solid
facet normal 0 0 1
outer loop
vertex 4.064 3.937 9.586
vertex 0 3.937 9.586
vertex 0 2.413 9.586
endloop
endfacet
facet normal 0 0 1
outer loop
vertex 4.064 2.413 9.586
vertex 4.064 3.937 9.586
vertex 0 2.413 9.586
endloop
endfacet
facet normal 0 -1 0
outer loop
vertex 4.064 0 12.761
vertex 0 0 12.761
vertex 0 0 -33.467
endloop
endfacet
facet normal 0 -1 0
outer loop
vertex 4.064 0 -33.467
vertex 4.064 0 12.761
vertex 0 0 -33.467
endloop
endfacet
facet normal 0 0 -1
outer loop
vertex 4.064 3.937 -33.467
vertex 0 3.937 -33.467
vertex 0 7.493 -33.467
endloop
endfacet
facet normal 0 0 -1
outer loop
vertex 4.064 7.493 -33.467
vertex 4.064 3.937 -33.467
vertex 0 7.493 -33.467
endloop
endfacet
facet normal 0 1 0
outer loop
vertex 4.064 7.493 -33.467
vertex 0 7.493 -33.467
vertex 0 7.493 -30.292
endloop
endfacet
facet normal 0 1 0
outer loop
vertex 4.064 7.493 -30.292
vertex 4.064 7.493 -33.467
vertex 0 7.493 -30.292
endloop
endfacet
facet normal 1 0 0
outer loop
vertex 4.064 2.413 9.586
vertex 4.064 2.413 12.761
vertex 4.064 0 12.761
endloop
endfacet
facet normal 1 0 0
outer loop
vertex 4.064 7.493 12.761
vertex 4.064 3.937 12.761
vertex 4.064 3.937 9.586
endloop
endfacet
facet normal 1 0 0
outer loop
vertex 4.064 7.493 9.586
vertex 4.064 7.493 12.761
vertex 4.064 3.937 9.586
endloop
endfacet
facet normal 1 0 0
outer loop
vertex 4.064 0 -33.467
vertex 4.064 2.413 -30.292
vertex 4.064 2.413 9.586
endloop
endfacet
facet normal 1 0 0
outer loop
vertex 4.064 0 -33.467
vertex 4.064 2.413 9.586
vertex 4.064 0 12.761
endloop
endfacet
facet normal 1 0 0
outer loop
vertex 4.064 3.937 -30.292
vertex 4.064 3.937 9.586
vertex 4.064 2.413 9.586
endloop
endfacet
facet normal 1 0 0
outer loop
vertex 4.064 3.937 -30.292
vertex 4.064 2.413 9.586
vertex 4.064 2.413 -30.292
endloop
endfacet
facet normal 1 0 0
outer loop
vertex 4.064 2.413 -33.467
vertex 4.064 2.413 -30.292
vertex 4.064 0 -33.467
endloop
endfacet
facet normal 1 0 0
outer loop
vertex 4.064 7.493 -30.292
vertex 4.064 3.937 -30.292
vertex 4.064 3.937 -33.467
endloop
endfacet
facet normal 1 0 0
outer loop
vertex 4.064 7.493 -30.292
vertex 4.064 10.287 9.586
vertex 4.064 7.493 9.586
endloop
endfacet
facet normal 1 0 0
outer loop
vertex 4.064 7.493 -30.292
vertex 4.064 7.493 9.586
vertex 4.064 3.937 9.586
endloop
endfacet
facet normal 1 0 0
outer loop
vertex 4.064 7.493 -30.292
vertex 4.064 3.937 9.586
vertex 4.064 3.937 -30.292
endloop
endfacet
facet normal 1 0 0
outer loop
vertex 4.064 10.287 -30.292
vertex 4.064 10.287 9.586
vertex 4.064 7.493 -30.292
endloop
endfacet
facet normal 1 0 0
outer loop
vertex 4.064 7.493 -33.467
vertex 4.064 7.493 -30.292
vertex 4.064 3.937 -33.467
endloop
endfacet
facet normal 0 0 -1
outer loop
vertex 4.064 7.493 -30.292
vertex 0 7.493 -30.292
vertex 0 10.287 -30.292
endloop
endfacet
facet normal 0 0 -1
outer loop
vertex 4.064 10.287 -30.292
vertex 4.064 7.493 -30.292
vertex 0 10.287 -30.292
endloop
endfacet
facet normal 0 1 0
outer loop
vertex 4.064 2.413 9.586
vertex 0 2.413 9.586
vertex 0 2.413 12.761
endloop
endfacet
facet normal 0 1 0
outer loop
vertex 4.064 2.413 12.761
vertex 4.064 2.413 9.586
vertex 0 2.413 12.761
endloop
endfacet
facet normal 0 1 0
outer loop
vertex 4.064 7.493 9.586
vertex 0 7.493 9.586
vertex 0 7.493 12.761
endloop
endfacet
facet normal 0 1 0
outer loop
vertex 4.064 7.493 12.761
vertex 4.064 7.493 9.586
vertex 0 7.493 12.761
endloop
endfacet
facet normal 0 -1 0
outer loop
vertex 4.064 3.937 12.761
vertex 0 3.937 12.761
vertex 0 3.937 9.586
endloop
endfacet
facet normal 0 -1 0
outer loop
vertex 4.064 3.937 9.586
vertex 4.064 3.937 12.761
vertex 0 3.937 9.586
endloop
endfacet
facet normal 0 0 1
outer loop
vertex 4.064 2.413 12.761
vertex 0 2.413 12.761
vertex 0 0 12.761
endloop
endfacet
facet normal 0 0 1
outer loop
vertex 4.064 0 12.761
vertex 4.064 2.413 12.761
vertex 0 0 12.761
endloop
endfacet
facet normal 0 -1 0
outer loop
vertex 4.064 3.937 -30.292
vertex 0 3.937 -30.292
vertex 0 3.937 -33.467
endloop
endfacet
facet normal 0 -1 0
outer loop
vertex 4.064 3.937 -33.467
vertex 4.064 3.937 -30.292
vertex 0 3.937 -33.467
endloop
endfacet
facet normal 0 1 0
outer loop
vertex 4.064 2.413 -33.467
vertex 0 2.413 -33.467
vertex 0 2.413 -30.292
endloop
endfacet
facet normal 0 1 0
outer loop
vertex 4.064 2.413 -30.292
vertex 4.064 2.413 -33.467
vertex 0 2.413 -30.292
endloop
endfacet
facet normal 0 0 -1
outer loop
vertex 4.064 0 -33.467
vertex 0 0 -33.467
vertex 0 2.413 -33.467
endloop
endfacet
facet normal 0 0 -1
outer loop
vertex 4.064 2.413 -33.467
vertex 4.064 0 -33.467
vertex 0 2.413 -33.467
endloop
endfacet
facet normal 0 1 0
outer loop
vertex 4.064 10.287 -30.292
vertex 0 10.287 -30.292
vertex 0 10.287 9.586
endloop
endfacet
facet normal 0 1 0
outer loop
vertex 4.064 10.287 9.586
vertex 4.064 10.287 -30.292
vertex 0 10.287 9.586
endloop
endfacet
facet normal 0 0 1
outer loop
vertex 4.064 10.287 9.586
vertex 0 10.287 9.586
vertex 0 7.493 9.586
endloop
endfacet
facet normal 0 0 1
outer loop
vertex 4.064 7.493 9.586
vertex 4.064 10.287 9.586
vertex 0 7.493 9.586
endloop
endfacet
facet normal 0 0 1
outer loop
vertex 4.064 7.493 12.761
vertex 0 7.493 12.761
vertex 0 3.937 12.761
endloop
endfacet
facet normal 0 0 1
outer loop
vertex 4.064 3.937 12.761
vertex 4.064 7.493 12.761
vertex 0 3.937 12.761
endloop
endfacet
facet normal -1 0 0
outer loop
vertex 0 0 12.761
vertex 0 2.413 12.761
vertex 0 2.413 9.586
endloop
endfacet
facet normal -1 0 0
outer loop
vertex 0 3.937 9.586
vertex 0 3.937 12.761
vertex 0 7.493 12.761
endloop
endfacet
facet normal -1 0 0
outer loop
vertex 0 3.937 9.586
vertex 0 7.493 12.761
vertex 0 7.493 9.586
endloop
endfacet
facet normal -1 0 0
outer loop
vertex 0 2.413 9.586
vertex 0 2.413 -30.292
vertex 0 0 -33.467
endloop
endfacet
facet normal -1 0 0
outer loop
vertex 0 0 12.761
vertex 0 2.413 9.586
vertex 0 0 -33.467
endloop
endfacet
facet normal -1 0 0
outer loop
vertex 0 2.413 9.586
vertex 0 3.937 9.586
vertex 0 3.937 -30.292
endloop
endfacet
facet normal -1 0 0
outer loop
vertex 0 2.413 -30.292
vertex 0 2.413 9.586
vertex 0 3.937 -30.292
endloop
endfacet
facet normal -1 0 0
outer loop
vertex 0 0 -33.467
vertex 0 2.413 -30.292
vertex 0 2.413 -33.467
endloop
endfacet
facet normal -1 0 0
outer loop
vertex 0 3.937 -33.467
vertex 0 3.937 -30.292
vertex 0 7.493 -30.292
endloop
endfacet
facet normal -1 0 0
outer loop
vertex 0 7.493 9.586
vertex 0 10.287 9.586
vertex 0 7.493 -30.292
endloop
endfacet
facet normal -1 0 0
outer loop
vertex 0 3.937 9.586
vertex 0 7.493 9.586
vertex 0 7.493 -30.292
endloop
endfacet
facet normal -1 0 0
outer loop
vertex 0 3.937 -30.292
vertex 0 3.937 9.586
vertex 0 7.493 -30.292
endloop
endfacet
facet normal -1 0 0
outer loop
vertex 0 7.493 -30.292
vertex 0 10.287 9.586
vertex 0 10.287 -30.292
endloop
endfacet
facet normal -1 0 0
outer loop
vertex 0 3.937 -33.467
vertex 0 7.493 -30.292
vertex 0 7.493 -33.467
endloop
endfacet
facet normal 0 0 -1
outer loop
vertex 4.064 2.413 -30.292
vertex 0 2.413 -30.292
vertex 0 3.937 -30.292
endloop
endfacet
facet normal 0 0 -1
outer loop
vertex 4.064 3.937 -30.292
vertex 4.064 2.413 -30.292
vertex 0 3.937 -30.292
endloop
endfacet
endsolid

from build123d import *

# Parameters (mm, degrees)
BOSS_EXTRUDE1_DEPTH = 4.064


with BuildPart() as part:
    # Sketch1 → Boss-Extrude1 (new body)
    with BuildSketch(Plane(origin=(0, 0, 0), x_dir=(0, 0, -1), z_dir=(1, 0, 0))):
        Polygon((10.353307799, 10.287), (10.353307799, 0), (33.467307799, 0), (33.467307799, 2.413), (30.292307799, 2.413), (30.292307799, 3.937), (33.467307799, 3.937), (33.467307799, 7.493), (30.292307799, 7.493), (30.292307799, 10.287), align=None)
        Polygon((-12.760692201, 2.413), (-12.760692201, 0), (10.353307799, 0), (10.353307799, 10.287), (-9.585692201, 10.287), (-9.585692201, 7.493), (-12.760692201, 7.493), (-12.760692201, 3.937), (-9.585692201, 3.937), (-9.585692201, 2.413), align=None)
    extrude(amount=BOSS_EXTRUDE1_DEPTH)


solid = part.part
